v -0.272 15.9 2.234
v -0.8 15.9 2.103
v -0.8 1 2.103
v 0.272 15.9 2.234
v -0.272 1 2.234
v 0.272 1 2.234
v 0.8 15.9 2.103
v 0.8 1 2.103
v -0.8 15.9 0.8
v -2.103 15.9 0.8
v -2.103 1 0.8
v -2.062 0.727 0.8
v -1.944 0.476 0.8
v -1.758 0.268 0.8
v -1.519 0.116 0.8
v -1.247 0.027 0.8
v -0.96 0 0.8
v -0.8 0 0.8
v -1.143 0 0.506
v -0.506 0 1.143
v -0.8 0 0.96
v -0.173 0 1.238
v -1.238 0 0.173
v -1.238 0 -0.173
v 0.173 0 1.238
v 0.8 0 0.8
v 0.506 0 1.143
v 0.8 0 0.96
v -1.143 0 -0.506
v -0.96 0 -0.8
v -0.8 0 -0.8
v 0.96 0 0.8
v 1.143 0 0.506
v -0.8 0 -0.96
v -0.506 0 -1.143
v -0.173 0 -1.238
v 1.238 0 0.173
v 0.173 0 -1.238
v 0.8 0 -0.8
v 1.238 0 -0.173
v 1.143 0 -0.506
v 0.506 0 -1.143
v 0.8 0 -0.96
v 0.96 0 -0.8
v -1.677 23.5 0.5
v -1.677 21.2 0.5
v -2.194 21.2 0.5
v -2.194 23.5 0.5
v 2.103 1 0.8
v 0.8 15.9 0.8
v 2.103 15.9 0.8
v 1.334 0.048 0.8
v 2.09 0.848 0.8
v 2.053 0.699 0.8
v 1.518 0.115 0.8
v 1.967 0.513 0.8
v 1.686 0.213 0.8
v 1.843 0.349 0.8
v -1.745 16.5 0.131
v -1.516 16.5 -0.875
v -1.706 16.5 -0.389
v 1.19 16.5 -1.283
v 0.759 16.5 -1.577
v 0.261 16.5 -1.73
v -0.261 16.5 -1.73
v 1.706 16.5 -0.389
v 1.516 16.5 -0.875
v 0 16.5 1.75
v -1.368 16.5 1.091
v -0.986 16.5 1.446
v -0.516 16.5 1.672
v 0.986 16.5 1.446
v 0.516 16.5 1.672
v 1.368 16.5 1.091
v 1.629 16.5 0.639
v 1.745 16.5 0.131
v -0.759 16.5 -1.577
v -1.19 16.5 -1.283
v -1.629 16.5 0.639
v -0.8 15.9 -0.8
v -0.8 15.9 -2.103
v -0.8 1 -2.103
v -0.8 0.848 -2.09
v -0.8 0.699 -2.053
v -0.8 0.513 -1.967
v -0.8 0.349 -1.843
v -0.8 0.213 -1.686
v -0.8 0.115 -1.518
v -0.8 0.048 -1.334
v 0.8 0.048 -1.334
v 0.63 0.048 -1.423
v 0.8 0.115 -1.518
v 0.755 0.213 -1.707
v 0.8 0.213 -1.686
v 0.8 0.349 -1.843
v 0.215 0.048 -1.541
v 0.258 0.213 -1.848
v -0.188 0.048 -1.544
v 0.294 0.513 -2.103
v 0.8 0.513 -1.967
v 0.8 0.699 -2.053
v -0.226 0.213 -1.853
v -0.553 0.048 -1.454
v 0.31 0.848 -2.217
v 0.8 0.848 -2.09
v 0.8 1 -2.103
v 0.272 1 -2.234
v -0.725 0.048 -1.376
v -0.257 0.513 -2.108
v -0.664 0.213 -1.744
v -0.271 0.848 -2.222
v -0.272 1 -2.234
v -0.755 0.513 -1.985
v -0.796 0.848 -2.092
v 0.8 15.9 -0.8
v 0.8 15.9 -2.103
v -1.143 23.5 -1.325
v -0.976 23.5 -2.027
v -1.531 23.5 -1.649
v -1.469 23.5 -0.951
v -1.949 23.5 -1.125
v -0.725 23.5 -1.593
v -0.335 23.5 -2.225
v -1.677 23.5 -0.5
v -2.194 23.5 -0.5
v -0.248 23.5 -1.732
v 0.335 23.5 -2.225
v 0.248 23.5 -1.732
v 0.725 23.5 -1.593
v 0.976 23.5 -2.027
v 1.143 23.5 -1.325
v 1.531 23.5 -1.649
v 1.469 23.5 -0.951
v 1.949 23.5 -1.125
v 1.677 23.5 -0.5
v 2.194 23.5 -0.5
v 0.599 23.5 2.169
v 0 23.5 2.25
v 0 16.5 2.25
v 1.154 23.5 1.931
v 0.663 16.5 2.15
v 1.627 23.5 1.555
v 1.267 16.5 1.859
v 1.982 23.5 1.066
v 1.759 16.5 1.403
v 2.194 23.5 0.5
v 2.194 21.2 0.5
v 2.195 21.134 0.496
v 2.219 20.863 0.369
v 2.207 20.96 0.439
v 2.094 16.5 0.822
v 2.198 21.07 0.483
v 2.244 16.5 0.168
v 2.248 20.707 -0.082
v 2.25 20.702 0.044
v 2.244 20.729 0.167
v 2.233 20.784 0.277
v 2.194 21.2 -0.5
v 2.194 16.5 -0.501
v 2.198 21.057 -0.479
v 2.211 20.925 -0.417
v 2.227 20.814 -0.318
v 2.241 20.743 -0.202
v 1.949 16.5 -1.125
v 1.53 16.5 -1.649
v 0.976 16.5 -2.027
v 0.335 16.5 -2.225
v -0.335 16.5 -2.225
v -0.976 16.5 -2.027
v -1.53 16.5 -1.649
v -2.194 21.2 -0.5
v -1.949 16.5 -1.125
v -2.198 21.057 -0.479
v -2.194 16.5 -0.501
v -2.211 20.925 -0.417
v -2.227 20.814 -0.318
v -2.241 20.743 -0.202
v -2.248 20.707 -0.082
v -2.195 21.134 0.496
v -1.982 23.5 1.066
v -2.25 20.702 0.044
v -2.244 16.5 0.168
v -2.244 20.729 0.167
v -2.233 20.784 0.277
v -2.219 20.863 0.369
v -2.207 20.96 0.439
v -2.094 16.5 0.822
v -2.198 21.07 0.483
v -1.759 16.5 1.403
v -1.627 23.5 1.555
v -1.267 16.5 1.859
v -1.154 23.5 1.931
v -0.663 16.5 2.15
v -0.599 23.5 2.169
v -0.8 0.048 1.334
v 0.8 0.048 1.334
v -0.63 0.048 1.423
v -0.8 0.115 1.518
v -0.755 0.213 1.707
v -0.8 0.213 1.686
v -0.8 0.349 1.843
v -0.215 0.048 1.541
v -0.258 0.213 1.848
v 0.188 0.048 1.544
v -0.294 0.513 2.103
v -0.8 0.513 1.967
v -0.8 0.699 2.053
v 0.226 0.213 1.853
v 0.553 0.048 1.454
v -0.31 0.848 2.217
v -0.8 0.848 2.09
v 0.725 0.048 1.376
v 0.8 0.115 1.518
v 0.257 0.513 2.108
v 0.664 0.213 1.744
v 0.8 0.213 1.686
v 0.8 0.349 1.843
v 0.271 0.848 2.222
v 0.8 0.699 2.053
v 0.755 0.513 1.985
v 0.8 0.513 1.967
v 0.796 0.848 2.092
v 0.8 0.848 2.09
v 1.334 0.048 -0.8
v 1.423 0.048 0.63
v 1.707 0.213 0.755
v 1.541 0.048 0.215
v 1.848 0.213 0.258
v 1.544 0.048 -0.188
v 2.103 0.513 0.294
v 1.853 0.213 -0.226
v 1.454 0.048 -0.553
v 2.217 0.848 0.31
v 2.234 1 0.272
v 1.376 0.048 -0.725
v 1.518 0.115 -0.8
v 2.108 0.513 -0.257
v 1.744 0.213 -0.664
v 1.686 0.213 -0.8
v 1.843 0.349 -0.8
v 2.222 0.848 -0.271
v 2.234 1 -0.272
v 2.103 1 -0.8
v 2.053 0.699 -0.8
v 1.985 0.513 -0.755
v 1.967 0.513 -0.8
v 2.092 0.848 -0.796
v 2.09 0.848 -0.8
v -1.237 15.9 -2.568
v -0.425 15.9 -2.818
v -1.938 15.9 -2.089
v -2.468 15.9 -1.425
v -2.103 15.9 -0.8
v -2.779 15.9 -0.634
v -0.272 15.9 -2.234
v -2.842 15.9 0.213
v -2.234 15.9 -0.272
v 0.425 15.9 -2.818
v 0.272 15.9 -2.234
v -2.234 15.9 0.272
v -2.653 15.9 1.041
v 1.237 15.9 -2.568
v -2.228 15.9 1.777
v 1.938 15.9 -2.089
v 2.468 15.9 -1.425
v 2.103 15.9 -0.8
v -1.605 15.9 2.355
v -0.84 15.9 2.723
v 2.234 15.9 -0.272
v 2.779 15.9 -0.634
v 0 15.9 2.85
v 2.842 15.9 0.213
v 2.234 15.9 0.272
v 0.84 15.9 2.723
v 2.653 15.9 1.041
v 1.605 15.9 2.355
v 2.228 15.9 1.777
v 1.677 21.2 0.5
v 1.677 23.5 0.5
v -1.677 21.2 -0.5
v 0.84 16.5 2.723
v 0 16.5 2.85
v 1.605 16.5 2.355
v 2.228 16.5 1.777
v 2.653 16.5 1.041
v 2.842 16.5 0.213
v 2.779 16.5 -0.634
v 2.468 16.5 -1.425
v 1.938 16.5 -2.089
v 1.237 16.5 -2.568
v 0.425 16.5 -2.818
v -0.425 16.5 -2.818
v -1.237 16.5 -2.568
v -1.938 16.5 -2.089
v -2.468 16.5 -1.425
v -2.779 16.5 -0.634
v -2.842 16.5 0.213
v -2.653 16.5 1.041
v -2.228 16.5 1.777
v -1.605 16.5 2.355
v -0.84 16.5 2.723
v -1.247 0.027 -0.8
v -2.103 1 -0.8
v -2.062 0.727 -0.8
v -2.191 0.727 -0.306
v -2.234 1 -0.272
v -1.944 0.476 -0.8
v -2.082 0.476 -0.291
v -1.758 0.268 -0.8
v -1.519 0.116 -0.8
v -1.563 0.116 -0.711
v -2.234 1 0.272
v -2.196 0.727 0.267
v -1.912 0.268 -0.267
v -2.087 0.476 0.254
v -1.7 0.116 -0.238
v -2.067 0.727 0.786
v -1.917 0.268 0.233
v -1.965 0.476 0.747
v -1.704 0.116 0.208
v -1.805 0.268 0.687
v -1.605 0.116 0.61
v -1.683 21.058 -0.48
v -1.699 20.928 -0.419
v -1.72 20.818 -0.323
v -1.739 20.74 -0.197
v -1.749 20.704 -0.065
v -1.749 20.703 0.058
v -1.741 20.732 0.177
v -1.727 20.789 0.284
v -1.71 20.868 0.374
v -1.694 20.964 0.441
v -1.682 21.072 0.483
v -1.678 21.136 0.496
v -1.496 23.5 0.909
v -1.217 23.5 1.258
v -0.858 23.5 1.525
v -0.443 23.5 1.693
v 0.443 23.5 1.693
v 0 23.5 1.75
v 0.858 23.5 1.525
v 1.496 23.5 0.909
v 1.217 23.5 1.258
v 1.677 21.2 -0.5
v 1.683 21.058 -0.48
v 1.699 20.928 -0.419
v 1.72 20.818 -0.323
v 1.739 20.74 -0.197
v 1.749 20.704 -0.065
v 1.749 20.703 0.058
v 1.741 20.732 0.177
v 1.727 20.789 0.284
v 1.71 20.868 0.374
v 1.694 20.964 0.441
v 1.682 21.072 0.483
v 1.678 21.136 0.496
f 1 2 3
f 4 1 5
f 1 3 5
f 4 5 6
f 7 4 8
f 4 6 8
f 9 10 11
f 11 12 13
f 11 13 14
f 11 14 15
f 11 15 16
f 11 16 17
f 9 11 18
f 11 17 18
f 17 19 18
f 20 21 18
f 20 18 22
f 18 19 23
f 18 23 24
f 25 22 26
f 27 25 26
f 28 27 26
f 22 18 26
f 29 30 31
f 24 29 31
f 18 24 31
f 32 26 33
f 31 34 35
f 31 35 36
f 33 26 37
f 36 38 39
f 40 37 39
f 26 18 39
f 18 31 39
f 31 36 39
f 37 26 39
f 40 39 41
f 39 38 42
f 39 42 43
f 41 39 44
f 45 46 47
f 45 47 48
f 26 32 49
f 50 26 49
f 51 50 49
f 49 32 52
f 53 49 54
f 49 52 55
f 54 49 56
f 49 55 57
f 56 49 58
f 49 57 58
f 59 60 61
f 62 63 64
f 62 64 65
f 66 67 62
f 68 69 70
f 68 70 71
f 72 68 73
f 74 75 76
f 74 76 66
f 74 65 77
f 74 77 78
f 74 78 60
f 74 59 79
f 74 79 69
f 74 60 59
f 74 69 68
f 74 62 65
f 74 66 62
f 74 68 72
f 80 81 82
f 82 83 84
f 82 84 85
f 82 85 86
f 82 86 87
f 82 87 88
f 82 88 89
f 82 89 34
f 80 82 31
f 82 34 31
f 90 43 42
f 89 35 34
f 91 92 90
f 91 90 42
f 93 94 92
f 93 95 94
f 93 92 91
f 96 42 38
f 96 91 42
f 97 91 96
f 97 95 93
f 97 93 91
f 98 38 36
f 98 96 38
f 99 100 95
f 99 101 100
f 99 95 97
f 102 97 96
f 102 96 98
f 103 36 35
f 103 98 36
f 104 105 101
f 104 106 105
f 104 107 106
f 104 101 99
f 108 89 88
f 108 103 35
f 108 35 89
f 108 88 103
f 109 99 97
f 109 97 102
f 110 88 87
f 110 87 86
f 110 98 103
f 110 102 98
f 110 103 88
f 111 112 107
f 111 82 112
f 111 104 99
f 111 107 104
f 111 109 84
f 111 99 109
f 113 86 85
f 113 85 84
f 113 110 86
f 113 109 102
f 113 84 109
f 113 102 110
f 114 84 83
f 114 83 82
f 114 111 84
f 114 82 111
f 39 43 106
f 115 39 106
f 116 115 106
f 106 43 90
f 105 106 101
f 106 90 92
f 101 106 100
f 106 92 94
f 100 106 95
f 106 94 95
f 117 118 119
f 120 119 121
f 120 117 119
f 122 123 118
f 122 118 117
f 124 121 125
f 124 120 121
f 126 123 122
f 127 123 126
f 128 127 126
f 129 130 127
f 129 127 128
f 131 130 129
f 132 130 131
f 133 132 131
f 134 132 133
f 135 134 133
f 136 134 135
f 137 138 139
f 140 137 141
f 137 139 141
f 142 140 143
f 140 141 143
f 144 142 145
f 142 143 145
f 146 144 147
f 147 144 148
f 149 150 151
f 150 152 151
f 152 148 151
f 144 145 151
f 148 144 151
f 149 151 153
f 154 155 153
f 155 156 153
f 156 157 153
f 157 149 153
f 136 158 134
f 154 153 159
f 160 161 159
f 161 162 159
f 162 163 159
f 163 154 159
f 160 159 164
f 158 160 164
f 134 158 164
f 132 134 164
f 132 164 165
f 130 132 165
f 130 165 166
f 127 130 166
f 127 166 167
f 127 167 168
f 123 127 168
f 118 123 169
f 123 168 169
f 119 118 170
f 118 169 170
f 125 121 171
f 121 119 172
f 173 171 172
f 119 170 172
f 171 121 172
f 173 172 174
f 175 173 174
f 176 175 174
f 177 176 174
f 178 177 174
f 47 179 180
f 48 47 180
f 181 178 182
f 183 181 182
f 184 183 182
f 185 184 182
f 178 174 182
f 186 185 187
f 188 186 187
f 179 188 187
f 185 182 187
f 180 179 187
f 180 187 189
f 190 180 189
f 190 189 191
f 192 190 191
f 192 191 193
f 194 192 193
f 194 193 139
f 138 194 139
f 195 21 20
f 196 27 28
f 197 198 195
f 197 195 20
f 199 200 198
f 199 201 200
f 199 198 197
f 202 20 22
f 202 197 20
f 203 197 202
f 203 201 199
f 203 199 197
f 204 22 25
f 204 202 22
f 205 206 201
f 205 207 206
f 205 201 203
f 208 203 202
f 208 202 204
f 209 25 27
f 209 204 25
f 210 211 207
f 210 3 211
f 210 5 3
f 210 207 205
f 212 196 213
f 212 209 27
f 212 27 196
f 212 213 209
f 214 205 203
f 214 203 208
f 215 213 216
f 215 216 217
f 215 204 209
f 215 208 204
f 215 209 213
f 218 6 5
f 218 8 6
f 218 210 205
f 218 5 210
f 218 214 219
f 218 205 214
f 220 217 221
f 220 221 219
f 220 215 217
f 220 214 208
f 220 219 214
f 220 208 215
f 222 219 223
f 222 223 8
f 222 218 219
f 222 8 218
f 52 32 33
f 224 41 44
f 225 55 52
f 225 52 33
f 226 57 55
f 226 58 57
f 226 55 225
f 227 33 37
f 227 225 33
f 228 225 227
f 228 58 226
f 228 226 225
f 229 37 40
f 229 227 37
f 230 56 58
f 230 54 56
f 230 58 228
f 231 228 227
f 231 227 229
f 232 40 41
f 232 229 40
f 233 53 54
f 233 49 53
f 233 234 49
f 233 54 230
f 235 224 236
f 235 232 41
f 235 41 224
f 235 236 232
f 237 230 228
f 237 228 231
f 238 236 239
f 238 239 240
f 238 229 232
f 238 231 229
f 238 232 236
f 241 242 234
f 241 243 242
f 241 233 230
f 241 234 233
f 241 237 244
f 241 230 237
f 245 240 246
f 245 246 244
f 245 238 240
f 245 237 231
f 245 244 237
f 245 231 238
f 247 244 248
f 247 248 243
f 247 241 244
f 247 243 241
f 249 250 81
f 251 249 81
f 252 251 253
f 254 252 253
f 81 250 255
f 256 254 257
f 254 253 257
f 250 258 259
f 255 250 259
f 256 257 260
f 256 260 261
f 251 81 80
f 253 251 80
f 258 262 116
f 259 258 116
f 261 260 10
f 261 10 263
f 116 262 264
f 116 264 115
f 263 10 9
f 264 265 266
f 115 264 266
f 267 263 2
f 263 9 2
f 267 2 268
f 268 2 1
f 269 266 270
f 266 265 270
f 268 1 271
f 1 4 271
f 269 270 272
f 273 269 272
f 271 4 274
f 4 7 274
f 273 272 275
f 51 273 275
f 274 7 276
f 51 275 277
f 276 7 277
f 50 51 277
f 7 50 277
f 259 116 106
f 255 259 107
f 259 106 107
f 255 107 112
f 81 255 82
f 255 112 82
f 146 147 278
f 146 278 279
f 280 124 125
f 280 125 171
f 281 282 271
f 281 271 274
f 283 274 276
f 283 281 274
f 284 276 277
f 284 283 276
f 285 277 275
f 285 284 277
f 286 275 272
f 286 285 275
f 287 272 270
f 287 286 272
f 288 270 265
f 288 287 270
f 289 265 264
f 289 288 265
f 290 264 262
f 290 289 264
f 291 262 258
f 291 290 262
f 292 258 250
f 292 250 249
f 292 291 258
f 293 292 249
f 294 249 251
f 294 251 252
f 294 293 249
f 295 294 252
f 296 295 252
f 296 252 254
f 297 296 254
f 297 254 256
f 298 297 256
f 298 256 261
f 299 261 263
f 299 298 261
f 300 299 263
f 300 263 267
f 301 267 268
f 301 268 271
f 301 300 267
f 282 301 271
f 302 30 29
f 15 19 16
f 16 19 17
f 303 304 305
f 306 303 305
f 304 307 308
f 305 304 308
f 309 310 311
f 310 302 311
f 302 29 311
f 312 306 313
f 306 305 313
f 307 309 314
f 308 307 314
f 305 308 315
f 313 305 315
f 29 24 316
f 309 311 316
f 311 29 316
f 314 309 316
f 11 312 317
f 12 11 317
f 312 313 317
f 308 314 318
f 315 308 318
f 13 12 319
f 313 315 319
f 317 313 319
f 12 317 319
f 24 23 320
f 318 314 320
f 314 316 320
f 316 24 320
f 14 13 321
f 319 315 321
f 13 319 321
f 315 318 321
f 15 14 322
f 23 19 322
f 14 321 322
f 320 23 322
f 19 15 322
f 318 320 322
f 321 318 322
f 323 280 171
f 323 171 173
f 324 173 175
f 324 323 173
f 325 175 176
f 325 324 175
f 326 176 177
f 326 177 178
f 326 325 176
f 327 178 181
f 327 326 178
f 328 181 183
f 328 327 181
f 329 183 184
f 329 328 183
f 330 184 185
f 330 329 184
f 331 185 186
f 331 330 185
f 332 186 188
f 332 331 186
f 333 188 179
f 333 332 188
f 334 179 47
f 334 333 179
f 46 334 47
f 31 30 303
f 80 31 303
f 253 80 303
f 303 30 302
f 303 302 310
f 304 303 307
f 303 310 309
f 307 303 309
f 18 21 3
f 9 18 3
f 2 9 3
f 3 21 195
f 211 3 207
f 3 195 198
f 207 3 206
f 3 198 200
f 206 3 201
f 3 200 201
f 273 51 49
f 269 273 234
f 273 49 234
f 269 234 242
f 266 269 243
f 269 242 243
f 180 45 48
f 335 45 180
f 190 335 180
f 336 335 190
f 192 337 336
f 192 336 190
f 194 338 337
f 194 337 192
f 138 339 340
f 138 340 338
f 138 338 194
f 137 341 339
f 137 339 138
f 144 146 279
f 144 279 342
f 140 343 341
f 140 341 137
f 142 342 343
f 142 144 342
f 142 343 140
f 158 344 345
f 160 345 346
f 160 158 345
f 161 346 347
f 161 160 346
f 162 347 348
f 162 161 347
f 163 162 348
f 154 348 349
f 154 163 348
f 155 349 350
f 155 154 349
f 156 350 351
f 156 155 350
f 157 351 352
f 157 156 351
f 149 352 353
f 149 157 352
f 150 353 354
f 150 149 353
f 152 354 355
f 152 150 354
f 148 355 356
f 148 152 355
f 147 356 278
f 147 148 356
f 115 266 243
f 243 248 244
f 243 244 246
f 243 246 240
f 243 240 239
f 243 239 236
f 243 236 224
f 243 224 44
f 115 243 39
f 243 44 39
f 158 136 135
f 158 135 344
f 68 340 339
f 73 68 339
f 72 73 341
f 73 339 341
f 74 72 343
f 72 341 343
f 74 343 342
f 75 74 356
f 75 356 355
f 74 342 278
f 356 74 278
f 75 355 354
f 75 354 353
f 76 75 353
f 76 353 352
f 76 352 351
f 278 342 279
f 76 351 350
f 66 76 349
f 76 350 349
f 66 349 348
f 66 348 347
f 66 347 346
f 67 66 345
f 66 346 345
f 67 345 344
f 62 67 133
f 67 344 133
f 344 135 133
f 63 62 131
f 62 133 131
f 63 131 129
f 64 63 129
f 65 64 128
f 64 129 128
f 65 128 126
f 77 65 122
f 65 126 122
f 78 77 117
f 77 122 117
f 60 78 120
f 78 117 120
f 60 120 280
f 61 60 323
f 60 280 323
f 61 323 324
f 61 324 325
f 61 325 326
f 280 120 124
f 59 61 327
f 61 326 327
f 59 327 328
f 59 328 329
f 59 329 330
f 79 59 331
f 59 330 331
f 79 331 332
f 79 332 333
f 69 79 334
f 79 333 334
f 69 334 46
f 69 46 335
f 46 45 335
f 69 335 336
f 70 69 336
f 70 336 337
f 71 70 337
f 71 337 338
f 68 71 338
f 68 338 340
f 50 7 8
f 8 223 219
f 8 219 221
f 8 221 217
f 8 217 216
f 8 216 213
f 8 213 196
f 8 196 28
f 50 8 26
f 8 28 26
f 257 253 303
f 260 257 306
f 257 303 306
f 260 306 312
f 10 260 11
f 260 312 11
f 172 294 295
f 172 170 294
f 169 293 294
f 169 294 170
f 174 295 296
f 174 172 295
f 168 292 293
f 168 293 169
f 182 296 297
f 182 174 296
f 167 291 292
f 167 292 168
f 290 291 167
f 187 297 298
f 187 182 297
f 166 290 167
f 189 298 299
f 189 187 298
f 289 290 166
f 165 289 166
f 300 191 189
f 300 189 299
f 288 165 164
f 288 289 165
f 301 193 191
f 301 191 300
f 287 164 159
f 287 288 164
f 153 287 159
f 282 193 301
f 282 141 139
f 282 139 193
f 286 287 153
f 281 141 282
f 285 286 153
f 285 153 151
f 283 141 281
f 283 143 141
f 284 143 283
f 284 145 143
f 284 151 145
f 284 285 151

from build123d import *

# Parameters (mm, degrees)
BOSS_EXTRUDE1_DEPTH = 16.5
FILLET1_R           = 1
FILLET2_R           = 1
FILLET3_R           = 1
FILLET4_R           = 1
SKETCH3_R           = 2.85
BOSS_EXTRUDE2_DEPTH = 0.6
SKETCH4_R           = 2.25
BOSS_EXTRUDE3_DEPTH = 7
CUT_EXTRUDE2_DEPTH  = 27.935014386
SKETCH8_R           = 1.75
CUT_EXTRUDE3_DEPTH  = 7


with BuildPart() as part:
    # Sketch1 → Boss-Extrude1 (new body)
    with BuildSketch(Plane(origin=(0, 0, 0), x_dir=(1, 0, 0), z_dir=(0, 1, 0))):
        with BuildLine():
            Line((-0.8, -0.8), (-0.8, -2.102974084))
            ThreePointArc((-0.8, -2.102974084), (0, -2.25), (0.8, -2.102974084))
            Line((0.8, -2.102974084), (0.8, -0.8))
            Line((0.8, -0.8), (2.102974084, -0.8))
            ThreePointArc((2.102974084, -0.8), (2.25, 0), (2.102974084, 0.8))
            Line((2.102974084, 0.8), (0.8, 0.8))
            Line((0.8, 0.8), (0.8, 2.102974084))
            ThreePointArc((0.8, 2.102974084), (0, 2.25), (-0.8, 2.102974084))
            Line((-0.8, 2.102974084), (-0.8, 0.8))
            Line((-0.8, 0.8), (-2.102974084, 0.8))
            ThreePointArc((-2.102974084, 0.8), (-2.25, 0), (-2.102974084, -0.8))
            Line((-2.102974084, -0.8), (-0.8, -0.8))
        make_face()
    extrude(amount=BOSS_EXTRUDE1_DEPTH)

    # Fillet1
    fillet1_edges = [part.edges().sort_by_distance(p)[0] for p in [
        (-2.25, 0, 0),
    ]]
    fillet(fillet1_edges, radius=FILLET1_R)

    # Fillet2
    fillet2_edges = [part.edges().sort_by_distance(p)[0] for p in [
        (0, 0, 2.25),
    ]]
    fillet(fillet2_edges, radius=FILLET2_R)

    # Fillet3
    fillet3_edges = [part.edges().sort_by_distance(p)[0] for p in [
        (2.25, 0, 0),
    ]]
    fillet(fillet3_edges, radius=FILLET3_R)

    # Fillet4
    fillet4_edges = [part.edges().sort_by_distance(p)[0] for p in [
        (0, 0, -2.25),
    ]]
    fillet(fillet4_edges, radius=FILLET4_R)

    # Sketch3 → Boss-Extrude2 (add)
    with BuildSketch(Plane(origin=(0, 16.5, 0), x_dir=(1, 0, 0), z_dir=(0, 1, 0))):
        with Locations(Location((0, 0, 0), (0, 0, 270))):
            Circle(SKETCH3_R)
    extrude(amount=-BOSS_EXTRUDE2_DEPTH)

    # Sketch4 → Boss-Extrude3 (add)
    with BuildSketch(Plane(origin=(0, 16.5, 0), x_dir=(1, 0, 0), z_dir=(0, 1, 0))):
        with Locations(Location((0, 0, 0), (0, 0, 270))):
            Circle(SKETCH4_R)
    extrude(amount=BOSS_EXTRUDE3_DEPTH)

    # Sketch5 → Cut-Extrude2 (cut, through all)
    with BuildSketch(Plane(origin=(10, 0, 0), x_dir=(0, 0, -1), z_dir=(1, 0, 0))):
        with BuildLine():
            Line((-0.5, 21.2), (-0.5, 23.5))
            ThreePointArc((-0.5, 23.5), (0, 24), (0.5, 23.5))
            Line((0.5, 23.5), (0.5, 21.2))
            ThreePointArc((0.5, 21.2), (0, 20.7), (-0.5, 21.2))
        make_face()
    extrude(amount=-CUT_EXTRUDE2_DEPTH, mode=Mode.SUBTRACT)

    # Sketch8 → Cut-Extrude3 (cut)
    with BuildSketch(Plane(origin=(0, 23.5, 0), x_dir=(1, 0, 0), z_dir=(0, 1, 0))):
        with Locations(Location((0, 0, 0), (0, 0, 270))):
            Circle(SKETCH8_R)
    extrude(amount=-CUT_EXTRUDE3_DEPTH, mode=Mode.SUBTRACT)


solid = part.part
